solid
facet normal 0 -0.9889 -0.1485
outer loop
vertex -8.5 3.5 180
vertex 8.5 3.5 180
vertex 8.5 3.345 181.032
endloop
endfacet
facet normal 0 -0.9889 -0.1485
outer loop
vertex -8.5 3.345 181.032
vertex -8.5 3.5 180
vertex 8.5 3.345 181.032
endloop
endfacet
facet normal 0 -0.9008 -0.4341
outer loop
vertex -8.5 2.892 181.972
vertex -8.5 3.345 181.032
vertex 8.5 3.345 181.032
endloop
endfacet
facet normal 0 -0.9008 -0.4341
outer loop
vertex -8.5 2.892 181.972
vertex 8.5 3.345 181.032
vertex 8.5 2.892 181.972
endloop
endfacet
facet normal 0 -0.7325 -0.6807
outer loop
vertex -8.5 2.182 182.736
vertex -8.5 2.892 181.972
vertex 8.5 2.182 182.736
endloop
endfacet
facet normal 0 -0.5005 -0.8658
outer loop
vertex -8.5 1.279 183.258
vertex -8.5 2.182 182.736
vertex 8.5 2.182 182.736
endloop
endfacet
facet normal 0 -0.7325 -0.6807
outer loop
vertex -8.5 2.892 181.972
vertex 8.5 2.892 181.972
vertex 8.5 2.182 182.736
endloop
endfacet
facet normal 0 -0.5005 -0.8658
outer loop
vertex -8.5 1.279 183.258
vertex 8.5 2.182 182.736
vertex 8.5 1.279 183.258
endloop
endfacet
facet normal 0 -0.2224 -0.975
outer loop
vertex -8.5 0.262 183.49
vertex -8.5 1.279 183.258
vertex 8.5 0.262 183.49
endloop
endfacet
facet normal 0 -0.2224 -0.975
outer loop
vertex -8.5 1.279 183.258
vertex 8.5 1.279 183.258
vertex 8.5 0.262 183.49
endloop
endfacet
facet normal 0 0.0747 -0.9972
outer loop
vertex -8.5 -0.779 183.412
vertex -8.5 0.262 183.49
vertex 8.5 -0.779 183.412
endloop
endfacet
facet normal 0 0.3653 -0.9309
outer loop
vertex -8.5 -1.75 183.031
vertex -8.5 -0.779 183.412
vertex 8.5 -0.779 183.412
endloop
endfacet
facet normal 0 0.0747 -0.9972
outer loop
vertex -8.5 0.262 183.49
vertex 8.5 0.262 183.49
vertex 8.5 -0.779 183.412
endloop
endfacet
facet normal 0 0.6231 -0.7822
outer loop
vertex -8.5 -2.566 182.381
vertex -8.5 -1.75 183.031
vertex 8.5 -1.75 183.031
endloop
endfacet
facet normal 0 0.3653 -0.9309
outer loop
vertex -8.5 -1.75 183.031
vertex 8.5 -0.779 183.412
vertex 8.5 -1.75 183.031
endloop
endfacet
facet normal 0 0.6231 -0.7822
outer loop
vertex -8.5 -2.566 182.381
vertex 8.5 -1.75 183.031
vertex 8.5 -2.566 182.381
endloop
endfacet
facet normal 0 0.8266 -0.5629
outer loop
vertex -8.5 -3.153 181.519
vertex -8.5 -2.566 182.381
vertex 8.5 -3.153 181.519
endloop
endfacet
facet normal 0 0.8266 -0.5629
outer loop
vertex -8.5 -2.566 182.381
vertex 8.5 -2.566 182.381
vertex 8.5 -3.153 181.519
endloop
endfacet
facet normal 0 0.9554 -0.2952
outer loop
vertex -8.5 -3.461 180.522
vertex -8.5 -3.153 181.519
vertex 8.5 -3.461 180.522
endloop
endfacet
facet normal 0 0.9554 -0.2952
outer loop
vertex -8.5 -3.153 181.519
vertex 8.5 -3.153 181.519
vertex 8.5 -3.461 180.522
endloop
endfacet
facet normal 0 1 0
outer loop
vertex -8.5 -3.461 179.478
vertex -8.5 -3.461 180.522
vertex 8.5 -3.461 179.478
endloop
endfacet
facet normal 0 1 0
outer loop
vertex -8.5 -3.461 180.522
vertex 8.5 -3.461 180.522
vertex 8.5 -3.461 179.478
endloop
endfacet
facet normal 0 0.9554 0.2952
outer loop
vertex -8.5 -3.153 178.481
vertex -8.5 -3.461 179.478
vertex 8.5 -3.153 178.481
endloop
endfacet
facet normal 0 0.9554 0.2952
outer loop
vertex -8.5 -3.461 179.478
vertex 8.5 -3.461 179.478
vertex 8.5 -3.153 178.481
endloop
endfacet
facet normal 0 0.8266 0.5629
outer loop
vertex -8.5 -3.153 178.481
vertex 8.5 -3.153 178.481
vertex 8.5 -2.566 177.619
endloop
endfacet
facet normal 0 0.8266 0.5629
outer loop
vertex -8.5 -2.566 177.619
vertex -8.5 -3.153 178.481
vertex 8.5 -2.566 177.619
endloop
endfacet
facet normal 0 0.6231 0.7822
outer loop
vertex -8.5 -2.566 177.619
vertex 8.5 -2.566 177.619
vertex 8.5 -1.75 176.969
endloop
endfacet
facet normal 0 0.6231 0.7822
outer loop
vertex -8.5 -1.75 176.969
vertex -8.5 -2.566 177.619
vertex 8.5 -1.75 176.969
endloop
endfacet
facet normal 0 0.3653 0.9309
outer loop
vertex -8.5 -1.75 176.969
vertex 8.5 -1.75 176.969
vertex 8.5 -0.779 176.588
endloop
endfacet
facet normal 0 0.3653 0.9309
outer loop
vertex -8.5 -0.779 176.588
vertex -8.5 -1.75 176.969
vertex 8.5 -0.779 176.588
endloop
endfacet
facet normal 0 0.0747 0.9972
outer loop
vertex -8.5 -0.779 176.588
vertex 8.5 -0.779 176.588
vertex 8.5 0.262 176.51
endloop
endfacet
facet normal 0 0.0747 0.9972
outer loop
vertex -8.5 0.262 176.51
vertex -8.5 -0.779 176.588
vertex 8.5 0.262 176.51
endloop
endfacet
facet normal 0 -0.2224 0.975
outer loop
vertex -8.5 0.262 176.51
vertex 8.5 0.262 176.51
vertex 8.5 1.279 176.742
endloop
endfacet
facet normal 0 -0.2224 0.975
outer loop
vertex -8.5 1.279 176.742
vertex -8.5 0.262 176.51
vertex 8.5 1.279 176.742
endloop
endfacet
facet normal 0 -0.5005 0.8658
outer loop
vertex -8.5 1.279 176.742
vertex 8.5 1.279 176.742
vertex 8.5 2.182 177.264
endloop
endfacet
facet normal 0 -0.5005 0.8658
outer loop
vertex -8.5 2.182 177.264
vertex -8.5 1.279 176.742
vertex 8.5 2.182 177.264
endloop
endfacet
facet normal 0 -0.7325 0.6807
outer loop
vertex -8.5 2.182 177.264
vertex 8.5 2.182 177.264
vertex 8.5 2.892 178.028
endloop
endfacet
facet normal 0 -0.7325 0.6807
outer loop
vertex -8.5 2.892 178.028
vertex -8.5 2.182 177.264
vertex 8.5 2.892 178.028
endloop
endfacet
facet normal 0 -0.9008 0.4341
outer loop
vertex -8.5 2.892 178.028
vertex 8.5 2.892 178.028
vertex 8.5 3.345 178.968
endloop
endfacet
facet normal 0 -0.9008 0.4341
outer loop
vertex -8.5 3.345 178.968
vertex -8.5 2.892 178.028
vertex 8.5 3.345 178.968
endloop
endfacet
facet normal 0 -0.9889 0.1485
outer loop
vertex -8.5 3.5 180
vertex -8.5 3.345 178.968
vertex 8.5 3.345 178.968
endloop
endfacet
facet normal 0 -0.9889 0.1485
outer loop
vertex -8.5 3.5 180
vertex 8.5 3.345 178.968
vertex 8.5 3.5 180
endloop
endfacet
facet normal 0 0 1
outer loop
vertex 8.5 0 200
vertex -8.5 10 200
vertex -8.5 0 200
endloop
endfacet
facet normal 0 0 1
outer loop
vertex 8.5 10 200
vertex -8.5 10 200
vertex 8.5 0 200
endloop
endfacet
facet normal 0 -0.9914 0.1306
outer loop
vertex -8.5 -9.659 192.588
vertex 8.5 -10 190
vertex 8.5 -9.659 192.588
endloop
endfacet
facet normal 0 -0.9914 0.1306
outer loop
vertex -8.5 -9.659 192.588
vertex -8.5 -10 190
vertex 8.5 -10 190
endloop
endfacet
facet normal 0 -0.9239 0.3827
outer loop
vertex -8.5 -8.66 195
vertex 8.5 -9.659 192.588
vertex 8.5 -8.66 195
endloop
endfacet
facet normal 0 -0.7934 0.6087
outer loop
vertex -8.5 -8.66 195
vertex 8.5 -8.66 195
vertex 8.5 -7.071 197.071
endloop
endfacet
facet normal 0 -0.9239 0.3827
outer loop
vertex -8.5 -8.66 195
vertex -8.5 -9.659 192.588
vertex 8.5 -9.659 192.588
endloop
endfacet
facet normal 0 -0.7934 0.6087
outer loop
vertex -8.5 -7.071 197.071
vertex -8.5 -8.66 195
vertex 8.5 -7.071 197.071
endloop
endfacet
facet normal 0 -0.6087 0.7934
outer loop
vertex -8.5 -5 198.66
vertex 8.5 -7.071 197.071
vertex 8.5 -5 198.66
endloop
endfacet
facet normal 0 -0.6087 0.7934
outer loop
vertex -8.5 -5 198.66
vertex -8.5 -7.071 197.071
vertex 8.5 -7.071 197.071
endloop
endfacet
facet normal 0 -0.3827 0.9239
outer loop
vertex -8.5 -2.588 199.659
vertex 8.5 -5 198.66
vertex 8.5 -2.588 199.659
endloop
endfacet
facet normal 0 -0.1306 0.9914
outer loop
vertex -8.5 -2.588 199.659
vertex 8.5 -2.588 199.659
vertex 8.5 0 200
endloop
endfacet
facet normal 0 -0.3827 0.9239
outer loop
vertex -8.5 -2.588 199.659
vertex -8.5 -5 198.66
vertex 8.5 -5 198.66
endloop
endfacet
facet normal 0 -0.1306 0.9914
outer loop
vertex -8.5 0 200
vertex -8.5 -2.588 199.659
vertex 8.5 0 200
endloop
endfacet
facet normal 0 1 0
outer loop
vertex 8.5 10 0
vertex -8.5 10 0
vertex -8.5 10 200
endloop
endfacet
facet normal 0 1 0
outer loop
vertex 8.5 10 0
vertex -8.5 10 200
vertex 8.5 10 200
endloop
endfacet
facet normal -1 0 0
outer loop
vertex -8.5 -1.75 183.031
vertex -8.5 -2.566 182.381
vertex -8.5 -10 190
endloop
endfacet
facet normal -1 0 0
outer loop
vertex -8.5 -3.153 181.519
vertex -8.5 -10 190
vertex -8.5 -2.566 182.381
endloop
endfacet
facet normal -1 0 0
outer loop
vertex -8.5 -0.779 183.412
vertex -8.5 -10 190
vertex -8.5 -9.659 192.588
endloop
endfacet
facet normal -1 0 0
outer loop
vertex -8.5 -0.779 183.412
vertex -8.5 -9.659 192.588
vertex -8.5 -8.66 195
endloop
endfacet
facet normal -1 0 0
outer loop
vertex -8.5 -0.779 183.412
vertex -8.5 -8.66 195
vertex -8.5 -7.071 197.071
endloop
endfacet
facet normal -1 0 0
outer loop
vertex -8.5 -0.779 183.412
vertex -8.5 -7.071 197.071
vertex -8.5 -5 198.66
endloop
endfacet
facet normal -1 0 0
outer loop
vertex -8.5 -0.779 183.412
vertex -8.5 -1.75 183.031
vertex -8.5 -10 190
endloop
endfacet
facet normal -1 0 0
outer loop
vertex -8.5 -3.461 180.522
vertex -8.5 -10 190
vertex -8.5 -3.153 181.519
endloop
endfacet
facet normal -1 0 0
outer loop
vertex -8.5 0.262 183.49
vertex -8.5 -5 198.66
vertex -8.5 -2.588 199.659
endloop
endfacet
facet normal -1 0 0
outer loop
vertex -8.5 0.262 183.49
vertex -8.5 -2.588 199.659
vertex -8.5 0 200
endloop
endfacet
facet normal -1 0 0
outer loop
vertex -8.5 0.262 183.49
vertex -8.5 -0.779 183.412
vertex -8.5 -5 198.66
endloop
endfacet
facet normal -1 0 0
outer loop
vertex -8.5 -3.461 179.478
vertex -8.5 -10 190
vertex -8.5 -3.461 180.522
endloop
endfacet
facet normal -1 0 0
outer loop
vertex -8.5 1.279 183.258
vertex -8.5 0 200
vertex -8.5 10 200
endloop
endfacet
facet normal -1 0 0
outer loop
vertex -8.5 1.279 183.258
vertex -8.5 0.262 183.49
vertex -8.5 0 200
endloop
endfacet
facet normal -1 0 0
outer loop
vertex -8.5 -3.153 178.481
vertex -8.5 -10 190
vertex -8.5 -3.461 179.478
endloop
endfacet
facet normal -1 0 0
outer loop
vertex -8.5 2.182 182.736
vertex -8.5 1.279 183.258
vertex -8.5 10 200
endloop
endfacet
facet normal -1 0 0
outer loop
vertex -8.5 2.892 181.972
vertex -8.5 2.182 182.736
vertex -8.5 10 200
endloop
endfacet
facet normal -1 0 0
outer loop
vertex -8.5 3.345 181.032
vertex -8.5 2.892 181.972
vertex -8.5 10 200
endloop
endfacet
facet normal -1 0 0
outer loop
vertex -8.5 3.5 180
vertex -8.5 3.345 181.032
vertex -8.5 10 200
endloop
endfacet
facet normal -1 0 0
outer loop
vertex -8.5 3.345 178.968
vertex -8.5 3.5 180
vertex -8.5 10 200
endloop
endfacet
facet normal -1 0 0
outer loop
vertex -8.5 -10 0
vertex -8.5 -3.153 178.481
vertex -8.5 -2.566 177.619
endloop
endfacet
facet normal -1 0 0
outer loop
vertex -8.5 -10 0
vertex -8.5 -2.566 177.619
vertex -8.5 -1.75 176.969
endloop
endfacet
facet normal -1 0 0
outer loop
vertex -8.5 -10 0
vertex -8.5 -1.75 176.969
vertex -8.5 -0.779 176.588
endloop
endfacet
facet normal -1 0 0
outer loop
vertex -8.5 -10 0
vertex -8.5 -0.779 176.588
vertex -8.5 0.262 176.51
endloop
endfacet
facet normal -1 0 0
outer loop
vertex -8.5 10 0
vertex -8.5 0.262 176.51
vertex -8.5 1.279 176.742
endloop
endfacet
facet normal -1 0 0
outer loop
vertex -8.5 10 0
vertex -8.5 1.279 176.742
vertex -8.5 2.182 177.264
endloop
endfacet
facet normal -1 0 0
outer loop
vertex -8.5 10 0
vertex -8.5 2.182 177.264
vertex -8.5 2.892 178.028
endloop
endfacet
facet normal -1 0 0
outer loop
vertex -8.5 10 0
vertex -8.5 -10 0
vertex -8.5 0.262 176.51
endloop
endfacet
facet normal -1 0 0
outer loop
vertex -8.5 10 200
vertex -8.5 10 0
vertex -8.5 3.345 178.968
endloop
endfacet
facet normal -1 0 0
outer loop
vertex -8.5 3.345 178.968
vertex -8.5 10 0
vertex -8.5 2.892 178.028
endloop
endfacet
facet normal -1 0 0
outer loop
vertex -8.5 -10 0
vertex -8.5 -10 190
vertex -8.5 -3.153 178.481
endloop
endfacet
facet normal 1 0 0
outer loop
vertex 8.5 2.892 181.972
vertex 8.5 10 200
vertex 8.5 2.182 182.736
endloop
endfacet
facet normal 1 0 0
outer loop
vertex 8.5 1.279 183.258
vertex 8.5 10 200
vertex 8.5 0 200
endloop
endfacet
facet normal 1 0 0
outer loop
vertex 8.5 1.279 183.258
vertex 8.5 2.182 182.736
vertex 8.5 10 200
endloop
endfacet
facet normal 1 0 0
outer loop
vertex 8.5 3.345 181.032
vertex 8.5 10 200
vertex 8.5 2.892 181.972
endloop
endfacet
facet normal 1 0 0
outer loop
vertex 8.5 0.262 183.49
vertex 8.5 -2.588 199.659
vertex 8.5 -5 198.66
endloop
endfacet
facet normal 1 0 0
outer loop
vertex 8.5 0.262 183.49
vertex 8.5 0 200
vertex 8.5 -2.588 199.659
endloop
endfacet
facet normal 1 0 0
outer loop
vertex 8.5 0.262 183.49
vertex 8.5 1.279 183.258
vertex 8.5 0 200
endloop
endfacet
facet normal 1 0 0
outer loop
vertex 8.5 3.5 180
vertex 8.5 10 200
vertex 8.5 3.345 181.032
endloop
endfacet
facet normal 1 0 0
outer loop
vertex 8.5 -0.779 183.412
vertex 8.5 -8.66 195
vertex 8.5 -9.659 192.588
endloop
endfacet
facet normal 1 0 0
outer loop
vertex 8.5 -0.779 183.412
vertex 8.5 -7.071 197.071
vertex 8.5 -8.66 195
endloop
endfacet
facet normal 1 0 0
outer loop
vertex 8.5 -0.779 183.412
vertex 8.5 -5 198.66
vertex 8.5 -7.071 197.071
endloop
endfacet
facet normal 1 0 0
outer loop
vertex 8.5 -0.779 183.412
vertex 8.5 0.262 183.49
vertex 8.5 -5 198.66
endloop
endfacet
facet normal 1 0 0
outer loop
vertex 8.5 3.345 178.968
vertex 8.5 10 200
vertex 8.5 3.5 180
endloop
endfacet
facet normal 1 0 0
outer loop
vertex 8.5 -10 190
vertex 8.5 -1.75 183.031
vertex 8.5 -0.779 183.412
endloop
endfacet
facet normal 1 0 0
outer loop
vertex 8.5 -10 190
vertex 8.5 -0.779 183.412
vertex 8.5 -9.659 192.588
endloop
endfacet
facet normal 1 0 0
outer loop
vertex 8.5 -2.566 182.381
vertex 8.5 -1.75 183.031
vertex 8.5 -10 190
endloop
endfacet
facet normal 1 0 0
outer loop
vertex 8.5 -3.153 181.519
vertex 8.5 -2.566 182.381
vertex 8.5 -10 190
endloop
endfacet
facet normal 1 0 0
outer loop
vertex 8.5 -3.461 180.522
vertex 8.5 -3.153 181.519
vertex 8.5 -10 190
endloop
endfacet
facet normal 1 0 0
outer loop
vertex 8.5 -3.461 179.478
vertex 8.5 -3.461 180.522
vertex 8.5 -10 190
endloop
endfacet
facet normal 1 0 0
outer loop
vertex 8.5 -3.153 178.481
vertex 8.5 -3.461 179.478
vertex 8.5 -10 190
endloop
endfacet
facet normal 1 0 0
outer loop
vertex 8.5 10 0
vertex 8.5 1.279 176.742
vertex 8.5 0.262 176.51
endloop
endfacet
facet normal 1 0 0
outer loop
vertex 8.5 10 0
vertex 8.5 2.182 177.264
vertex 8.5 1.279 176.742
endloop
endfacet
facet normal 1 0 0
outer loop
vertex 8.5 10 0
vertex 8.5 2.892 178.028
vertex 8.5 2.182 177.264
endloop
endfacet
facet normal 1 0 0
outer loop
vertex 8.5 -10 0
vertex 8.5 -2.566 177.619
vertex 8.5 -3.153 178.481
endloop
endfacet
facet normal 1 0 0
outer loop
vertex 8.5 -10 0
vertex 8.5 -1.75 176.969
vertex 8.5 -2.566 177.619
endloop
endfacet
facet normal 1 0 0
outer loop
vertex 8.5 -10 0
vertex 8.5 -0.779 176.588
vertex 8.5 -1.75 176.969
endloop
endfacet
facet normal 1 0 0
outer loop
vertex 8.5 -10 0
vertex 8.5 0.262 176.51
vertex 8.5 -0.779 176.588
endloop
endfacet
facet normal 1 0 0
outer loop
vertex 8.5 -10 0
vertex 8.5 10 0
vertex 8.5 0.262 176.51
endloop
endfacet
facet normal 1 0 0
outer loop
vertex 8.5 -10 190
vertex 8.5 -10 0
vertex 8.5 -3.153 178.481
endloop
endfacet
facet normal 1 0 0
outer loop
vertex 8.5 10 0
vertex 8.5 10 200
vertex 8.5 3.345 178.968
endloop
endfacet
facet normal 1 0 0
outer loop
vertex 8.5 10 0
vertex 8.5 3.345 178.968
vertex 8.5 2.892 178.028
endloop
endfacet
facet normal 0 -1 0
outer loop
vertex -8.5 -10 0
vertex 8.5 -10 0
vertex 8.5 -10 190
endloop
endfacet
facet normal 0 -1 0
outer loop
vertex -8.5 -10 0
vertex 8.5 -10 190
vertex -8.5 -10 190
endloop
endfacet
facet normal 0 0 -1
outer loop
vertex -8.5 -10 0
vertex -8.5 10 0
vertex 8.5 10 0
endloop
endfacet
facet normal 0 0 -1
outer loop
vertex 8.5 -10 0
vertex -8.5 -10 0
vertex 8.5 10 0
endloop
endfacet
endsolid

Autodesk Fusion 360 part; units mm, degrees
sketch "草图8" plane through (0, 0, 0) normal (0, 0, 1) x (1, 0, 0)
  line L0 (-8.5, 10) -> (8.5, 10)
  line L1 (8.5, 10) -> (8.5, -10)
  line L2 (8.5, -10) -> (-8.5, -10)
  line L3 (-8.5, -10) -> (-8.5, 10)
  line L4 (0, 1.75) -> (0, 22.5)
  line L5 (1.75, 0) -> (22.5, 0)
  dimension "d5" = 17
  dimension "d6" = 20
extrude "拉伸5" add sketch "草图8" along normal blind 200
fillet "圆角2" radius 10 2 edges at (0, -10, 200) (0, 10, 200)
sketch "草图10" plane through (8.5, 0, 0) normal (1, 0, 0) x (0, 1, 0)
  arc A0 (10, 190) -> (-10, 190) centre (0, 190) ccw
  line L0 (-10, 190) -> (-10, 0)
  line L1 (-10, 0) -> (10, 0)
  line L2 (10, 0) -> (10, 190)
  circle A1 centre (0, 180) radius 3.5
  dimension "d14" = 7
  dimension "d15" = 180
extrude "拉伸6" cut sketch "草图10" against normal blind 175 contours A1
